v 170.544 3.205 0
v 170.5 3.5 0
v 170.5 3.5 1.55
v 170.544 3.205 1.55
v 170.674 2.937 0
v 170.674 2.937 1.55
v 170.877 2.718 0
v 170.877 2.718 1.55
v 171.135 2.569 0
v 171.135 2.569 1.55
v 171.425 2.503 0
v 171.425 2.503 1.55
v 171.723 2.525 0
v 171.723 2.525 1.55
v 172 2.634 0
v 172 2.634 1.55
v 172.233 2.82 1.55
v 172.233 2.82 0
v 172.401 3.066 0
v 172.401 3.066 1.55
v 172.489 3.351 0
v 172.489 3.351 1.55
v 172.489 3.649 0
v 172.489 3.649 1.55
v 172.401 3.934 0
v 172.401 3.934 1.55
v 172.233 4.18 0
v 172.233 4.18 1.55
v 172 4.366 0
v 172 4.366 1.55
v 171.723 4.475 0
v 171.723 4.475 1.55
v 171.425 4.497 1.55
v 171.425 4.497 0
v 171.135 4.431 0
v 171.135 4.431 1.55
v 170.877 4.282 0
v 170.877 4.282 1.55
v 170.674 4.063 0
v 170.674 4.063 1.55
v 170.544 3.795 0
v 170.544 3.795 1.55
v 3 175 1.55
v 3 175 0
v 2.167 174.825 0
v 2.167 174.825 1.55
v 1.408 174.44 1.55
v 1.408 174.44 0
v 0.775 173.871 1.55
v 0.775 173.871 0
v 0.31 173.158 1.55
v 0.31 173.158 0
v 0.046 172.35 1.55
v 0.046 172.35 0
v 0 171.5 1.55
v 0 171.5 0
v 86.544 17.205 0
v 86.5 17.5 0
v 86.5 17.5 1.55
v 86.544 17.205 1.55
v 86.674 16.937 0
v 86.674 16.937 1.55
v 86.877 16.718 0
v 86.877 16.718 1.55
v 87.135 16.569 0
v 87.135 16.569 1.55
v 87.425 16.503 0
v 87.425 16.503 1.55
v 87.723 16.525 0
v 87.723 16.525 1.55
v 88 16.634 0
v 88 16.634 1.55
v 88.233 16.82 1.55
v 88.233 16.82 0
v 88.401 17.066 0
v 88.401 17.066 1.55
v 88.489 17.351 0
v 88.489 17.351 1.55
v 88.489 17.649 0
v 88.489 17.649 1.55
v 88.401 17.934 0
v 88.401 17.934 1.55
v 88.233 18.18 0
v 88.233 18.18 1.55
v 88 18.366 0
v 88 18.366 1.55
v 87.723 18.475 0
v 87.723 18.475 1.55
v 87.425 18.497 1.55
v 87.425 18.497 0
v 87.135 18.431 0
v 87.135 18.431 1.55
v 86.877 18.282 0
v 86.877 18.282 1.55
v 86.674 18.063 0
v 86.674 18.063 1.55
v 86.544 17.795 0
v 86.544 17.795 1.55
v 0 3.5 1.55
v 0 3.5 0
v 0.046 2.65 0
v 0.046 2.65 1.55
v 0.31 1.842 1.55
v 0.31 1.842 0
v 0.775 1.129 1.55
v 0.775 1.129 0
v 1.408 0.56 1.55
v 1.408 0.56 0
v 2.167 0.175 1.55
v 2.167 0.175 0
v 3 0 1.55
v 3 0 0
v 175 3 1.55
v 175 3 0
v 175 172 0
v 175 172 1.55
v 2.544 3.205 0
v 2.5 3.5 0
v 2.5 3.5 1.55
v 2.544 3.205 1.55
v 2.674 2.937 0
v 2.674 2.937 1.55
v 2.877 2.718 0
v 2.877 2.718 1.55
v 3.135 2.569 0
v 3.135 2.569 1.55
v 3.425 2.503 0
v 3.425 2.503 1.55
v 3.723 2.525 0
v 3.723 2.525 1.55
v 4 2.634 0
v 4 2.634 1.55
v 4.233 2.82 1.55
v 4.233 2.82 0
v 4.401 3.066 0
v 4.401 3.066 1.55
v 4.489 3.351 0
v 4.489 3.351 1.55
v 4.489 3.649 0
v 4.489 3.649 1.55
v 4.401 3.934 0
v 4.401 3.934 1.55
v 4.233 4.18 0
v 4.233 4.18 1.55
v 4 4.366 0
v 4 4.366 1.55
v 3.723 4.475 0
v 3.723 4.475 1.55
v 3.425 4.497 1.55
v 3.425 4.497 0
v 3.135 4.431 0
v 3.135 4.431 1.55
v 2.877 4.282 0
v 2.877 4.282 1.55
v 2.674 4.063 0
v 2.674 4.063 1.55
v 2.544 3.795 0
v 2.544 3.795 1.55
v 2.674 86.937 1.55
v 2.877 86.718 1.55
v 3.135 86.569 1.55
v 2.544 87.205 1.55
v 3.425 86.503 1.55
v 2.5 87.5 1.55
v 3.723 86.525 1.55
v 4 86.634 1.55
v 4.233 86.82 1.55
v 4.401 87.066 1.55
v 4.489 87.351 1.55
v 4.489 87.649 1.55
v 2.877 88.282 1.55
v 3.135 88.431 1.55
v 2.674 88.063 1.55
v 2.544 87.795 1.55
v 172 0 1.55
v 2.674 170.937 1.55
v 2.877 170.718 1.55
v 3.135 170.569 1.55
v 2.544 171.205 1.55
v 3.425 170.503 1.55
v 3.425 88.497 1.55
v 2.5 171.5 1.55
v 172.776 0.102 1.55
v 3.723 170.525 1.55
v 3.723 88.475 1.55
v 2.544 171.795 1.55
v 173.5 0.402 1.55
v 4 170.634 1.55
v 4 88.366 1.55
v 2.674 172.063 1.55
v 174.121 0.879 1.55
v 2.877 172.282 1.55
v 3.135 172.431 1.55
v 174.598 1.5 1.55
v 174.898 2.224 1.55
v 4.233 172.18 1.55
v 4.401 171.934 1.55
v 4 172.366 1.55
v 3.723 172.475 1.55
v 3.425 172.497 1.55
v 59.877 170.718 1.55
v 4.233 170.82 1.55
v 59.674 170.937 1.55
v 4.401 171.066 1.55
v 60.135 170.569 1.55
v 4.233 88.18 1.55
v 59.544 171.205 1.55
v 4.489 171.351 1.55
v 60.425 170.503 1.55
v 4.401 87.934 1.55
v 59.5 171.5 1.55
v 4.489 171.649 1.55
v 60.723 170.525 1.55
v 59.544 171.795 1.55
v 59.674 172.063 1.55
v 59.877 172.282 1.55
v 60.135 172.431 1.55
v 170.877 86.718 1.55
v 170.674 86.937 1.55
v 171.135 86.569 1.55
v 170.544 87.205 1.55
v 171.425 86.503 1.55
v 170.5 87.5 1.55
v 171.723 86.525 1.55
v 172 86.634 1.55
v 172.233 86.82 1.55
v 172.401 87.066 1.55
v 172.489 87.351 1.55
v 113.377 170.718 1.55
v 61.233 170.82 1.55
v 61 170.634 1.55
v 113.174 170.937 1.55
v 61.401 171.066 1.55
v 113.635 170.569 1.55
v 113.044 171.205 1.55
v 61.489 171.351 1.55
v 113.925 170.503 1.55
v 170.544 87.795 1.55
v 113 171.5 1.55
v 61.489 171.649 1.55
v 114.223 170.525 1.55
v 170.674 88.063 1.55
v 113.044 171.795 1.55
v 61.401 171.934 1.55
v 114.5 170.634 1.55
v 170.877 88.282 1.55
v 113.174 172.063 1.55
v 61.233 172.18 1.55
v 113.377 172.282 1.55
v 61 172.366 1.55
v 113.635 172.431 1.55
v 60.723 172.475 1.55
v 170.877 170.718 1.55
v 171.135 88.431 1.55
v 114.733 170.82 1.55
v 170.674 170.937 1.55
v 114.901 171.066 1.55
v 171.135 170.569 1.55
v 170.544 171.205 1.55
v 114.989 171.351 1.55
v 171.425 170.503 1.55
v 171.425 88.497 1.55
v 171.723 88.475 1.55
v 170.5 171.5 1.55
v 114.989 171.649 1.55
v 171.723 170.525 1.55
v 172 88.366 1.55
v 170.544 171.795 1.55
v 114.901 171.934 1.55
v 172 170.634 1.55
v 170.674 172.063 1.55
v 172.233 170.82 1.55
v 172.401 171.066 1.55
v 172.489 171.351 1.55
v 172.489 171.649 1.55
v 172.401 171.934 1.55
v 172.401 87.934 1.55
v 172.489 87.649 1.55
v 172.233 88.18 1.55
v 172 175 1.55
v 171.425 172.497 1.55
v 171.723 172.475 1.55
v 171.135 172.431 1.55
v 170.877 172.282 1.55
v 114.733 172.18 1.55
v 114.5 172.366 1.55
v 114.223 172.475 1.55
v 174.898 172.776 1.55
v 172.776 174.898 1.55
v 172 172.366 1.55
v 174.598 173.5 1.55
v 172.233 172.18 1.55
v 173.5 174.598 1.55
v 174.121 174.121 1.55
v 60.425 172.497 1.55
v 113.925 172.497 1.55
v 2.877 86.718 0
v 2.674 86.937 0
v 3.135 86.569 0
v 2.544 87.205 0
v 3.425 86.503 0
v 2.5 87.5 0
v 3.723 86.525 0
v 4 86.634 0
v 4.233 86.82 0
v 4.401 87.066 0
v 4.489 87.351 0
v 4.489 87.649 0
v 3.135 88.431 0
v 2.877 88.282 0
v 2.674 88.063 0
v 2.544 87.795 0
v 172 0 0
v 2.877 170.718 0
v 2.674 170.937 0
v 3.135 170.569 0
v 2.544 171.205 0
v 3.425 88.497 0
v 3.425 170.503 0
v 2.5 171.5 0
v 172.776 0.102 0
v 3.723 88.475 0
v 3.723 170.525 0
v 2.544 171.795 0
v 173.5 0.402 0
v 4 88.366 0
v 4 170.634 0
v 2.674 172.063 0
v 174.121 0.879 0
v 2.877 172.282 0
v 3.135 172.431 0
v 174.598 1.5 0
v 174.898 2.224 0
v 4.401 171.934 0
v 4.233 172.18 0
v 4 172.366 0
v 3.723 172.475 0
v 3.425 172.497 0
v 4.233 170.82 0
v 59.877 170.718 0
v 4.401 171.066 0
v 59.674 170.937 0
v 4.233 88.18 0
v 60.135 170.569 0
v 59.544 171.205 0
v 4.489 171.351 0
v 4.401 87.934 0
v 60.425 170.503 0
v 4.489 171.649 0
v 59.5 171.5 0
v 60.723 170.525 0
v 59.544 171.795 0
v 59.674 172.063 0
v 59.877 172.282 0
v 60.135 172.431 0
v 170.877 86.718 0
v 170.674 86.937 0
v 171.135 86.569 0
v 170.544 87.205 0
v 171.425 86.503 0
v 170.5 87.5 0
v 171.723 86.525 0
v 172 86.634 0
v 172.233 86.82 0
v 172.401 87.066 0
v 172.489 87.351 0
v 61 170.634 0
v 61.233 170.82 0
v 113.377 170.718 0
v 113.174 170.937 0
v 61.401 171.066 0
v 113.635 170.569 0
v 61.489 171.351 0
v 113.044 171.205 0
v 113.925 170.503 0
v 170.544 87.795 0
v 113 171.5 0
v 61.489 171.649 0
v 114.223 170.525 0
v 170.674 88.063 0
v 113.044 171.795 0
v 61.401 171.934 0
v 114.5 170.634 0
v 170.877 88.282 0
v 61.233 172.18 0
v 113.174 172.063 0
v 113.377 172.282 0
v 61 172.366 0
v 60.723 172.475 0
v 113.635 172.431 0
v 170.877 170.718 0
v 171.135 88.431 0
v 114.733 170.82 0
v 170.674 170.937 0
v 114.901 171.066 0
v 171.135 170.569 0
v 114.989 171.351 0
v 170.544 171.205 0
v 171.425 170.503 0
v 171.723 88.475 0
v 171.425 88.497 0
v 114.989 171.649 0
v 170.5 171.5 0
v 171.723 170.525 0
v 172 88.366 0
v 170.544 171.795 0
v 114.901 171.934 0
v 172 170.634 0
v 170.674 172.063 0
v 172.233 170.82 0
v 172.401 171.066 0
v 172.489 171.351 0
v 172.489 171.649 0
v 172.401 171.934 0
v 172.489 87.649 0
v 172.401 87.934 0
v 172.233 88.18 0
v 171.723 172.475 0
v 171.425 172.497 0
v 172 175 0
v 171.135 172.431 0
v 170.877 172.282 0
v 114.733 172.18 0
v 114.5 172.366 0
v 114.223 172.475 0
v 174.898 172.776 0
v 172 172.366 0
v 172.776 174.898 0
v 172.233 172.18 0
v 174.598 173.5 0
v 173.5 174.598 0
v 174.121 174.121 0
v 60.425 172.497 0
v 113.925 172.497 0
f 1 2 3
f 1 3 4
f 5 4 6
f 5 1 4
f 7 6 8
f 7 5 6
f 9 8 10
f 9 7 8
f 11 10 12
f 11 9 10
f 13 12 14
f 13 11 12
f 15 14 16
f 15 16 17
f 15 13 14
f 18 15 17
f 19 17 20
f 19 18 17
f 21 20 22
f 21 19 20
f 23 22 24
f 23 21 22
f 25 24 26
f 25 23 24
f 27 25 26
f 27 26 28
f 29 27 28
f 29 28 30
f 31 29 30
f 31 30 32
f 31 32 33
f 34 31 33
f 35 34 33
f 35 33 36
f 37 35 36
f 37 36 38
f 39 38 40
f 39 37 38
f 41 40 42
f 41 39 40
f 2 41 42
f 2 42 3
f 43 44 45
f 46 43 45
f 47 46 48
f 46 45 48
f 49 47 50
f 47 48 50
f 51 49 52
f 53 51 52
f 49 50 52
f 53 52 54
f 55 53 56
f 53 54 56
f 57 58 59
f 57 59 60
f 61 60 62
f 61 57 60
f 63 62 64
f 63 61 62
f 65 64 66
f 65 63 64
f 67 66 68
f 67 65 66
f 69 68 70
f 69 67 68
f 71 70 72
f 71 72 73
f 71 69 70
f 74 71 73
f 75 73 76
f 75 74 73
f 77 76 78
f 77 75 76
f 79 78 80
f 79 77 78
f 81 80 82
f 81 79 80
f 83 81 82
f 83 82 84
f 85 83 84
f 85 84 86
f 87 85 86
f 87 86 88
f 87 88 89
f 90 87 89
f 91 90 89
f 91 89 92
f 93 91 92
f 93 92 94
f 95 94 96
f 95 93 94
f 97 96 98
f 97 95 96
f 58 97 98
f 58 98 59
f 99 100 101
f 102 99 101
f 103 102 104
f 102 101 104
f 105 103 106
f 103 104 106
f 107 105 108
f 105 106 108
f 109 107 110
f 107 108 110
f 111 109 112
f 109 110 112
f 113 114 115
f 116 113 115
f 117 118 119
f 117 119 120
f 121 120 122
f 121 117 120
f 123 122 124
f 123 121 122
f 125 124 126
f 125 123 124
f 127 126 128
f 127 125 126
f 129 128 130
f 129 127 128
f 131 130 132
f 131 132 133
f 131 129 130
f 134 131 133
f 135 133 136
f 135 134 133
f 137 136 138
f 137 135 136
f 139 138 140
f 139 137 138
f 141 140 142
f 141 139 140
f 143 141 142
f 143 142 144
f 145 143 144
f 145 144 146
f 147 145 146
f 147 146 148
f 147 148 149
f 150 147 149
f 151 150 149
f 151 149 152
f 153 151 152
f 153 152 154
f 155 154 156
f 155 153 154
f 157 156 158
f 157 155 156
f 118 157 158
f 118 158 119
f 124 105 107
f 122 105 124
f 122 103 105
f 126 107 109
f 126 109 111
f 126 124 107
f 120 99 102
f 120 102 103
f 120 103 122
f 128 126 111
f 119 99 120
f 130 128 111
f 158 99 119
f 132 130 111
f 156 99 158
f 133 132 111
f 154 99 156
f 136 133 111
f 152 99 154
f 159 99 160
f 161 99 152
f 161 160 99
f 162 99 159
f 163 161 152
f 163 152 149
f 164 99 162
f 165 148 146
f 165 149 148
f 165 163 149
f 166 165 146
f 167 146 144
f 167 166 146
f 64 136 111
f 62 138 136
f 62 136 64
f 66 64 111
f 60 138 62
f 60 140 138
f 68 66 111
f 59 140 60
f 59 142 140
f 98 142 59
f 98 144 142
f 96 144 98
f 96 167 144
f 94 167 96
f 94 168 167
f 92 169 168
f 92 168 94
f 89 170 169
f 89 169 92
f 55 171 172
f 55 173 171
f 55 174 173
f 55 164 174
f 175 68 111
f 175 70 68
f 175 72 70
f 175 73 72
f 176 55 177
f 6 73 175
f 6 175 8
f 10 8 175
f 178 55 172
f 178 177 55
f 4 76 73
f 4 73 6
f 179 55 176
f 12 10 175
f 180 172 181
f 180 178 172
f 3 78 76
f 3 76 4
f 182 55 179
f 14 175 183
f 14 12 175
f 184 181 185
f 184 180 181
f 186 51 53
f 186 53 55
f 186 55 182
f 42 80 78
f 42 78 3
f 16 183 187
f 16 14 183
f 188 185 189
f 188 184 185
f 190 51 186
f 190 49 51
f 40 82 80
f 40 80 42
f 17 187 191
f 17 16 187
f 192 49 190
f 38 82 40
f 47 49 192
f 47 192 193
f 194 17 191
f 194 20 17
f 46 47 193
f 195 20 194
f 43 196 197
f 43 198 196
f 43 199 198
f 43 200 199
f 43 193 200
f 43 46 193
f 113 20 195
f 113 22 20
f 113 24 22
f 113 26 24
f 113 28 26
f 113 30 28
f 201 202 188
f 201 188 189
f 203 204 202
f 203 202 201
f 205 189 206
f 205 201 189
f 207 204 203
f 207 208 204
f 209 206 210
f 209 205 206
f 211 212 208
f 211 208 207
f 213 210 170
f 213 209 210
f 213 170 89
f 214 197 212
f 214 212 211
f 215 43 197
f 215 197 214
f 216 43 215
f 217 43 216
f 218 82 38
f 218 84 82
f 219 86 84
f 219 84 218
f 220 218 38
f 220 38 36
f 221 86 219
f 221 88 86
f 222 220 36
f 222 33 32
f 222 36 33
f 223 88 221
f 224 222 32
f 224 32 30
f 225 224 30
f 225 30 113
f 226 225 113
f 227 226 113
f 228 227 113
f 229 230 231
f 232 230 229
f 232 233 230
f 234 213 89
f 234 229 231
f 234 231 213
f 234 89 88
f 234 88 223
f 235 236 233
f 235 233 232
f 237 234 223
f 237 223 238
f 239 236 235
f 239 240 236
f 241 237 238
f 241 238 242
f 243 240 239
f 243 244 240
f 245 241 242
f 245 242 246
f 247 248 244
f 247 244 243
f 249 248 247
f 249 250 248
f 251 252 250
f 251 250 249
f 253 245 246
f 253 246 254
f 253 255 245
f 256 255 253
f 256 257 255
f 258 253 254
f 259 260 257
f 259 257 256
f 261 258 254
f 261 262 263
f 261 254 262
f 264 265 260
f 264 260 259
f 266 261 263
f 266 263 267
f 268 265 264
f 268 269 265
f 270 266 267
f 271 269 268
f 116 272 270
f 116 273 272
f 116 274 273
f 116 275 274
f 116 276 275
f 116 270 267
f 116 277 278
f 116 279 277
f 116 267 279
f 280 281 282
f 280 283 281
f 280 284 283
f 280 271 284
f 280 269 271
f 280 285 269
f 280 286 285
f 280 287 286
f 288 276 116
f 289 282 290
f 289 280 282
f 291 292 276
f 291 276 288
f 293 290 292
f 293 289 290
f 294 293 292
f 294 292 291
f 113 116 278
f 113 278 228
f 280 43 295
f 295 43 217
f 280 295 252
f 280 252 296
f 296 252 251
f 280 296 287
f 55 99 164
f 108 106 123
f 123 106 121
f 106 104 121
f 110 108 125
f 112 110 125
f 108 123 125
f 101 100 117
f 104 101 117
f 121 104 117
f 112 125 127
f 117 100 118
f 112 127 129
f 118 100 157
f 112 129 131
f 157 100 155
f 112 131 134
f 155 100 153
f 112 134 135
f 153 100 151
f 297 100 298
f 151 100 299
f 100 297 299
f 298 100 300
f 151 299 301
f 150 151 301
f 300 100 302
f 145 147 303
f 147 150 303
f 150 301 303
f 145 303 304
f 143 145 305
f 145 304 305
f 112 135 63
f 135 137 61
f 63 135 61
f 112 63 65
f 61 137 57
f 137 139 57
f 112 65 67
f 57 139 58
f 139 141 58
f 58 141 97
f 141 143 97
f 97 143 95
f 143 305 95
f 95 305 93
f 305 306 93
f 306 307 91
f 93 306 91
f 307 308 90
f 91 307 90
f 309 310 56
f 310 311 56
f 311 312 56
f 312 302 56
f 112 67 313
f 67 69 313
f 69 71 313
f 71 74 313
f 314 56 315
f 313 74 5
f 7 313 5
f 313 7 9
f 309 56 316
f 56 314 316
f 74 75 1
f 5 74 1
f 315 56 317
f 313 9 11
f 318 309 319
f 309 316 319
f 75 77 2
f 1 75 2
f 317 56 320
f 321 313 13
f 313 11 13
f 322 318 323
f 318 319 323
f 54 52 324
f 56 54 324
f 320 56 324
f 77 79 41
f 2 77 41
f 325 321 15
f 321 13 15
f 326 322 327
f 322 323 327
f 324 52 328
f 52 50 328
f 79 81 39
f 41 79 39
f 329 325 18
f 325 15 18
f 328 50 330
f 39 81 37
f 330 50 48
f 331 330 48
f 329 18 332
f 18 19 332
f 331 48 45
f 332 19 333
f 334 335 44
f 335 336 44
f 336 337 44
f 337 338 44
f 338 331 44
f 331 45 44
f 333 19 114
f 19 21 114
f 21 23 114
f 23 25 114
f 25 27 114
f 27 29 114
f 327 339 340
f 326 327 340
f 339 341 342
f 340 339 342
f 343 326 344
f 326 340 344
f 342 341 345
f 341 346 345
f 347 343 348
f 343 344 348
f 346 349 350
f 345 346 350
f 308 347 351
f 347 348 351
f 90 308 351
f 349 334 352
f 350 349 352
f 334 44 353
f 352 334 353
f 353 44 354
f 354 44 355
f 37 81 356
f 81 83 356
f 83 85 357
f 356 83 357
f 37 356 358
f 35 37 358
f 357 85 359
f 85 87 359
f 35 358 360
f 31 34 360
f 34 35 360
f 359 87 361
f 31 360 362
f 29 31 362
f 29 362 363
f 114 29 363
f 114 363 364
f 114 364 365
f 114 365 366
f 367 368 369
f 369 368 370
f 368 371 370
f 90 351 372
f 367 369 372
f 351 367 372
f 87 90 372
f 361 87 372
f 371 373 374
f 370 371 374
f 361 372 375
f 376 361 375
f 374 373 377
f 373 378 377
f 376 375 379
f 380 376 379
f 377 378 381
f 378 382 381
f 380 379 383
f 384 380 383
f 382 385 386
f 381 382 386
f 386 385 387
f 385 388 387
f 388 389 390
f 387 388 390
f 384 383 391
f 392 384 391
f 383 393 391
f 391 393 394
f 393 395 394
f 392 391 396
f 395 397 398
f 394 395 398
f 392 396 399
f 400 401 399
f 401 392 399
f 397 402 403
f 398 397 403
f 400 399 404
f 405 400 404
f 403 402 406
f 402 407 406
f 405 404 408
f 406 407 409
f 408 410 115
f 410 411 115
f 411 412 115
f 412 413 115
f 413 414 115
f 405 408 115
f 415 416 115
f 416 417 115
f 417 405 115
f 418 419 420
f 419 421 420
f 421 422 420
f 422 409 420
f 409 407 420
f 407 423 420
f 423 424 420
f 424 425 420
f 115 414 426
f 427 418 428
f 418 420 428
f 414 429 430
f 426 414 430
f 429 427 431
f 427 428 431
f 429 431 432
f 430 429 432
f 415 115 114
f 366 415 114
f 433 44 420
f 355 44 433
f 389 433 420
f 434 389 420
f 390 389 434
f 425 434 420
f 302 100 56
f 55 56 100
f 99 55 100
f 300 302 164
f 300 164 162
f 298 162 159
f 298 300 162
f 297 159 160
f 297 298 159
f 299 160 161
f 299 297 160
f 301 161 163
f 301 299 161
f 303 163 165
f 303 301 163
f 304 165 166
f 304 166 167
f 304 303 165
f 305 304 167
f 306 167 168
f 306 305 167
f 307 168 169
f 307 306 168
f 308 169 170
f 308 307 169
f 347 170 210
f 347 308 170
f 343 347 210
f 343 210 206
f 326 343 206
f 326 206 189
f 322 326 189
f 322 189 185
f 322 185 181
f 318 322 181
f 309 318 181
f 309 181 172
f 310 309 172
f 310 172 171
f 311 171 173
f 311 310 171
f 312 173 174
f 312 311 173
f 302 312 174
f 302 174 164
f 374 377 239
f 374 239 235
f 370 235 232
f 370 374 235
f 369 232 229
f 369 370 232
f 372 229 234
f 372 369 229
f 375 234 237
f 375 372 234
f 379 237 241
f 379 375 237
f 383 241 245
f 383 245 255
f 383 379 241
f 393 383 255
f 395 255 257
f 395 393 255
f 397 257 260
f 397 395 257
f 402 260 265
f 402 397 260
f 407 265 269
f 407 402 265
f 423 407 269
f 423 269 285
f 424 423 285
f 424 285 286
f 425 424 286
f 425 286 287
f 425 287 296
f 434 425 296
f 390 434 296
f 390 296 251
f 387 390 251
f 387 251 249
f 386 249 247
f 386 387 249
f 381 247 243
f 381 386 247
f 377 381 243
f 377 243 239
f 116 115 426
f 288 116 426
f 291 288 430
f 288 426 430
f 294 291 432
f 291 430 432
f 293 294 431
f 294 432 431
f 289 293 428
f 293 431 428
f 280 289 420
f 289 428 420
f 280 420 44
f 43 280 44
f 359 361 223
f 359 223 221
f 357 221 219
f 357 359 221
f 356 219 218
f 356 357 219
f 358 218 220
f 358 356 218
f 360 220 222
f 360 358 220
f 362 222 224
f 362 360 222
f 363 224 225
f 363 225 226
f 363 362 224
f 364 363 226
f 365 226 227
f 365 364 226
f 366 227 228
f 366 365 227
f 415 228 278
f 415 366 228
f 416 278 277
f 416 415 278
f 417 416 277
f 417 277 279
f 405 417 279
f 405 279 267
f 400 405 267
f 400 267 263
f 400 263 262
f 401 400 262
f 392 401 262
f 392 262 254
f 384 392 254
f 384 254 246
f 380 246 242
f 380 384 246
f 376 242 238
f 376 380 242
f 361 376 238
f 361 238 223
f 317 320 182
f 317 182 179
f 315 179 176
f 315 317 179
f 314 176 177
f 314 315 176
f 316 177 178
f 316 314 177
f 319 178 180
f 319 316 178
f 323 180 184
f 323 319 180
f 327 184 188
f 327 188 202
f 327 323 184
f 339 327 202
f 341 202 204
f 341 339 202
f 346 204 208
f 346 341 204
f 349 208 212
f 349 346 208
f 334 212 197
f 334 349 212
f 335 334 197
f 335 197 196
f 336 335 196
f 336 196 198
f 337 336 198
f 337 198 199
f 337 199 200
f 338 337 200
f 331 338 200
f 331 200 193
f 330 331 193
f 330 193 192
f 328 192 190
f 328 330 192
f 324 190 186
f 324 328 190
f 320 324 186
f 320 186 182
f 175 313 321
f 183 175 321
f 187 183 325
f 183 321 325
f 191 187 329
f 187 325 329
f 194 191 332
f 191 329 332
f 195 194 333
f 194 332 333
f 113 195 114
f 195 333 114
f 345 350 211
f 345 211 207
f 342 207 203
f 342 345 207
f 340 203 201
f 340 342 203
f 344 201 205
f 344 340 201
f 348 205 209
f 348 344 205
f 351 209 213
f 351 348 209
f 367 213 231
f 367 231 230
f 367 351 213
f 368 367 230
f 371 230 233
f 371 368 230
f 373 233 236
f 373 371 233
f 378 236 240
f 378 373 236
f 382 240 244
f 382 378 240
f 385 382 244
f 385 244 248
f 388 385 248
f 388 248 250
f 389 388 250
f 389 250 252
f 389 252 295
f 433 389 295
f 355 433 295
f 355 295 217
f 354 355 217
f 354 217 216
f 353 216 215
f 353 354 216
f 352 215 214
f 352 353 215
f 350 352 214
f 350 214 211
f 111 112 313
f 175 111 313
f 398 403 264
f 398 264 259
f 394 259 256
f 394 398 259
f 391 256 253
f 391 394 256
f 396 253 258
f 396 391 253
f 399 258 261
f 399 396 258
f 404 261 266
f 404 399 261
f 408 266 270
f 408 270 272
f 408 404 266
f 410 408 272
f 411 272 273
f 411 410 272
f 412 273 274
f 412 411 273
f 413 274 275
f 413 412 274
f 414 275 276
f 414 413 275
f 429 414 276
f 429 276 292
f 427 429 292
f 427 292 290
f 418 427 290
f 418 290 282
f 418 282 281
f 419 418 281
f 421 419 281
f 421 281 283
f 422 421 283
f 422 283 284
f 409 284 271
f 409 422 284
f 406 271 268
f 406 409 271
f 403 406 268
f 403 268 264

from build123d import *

# Parameters (mm, degrees)
MODEL_R             = 1
BOSS_EXTRUDE1_DEPTH = 1.55


with BuildPart() as part:
    # Model → Boss-Extrude1 (new body)
    with BuildSketch(Plane.XY):
        with BuildLine():
            Line((3, 0), (172, 0))
            ThreePointArc((172, 0), (174.121320344, 0.878679656), (175, 3))
            Line((175, 3), (175, 172))
            ThreePointArc((175, 172), (174.121320344, 174.121320344), (172, 175))
            Line((172, 175), (3, 175))
            ThreePointArc((3, 175), (0.775125888, 173.871320668), (0, 171.5))
            Line((0, 171.5), (0, 3.5))
            ThreePointArc((0, 3.5), (0.775125888, 1.128679332), (3, 0))
        make_face()
        with Locations(Location((3.5, 3.5, 0), (0, 0, 180))):
            Circle(MODEL_R, mode=Mode.SUBTRACT)
        with Locations(Location((87.5, 17.5, 0), (0, 0, 180))):
            Circle(MODEL_R, mode=Mode.SUBTRACT)
        with Locations(Location((171.5, 3.5, 0), (0, 0, 180))):
            Circle(MODEL_R, mode=Mode.SUBTRACT)
        with Locations(Location((171.5, 87.5, 0), (0, 0, 180))):
            Circle(MODEL_R, mode=Mode.SUBTRACT)
        with Locations(Location((3.5, 87.5, 0), (0, 0, 180))):
            Circle(MODEL_R, mode=Mode.SUBTRACT)
        with Locations(Location((171.5, 171.5, 0), (0, 0, 180))):
            Circle(MODEL_R, mode=Mode.SUBTRACT)
        with Locations(Location((60.5, 171.5, 0), (0, 0, 180))):
            Circle(MODEL_R, mode=Mode.SUBTRACT)
        with Locations(Location((3.5, 171.5, 0), (0, 0, 180))):
            Circle(MODEL_R, mode=Mode.SUBTRACT)
        with Locations(Location((114, 171.5, 0), (0, 0, 180))):
            Circle(MODEL_R, mode=Mode.SUBTRACT)
    extrude(amount=BOSS_EXTRUDE1_DEPTH)


solid = part.part
